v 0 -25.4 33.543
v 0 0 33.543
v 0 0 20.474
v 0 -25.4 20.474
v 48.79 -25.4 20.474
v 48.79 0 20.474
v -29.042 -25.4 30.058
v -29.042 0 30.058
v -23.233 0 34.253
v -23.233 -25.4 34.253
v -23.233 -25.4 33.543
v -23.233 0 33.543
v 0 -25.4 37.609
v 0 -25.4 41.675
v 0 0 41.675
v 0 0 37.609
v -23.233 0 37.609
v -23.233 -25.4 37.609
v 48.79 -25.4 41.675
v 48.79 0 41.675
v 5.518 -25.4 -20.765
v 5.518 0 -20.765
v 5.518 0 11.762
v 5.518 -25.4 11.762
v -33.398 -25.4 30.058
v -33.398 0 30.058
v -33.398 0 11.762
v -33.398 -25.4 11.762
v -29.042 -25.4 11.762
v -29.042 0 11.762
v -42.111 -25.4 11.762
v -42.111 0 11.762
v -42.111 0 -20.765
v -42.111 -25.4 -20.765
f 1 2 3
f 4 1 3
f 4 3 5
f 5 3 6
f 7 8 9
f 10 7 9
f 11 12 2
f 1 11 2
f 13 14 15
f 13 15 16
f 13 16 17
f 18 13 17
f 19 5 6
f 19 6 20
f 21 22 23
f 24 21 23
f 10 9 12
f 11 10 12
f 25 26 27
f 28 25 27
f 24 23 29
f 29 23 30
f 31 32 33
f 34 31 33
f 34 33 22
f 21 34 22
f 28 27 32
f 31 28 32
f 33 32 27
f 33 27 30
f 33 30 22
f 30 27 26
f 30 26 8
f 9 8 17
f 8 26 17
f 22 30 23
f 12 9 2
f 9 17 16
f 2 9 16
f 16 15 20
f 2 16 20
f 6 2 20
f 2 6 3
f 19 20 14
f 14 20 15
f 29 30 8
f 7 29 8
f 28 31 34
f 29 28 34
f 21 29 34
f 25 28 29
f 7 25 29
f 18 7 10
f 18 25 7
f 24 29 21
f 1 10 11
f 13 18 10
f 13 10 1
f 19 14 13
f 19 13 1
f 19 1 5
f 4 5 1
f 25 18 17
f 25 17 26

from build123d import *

# Parameters (mm, degrees)
F0_W     = 4.3562594801
F0_H     = 11.6166975349
F0_H_2   = 6.6796019673
F0_W_2   = 8.1316875294
F0_H_3   = 4.0658414364
F0_H_4   = 2.6137568057
F1_DEPTH = 25.4


with BuildPart() as f1:
    # F0 (on Front) → F1 (new body)
    with BuildSketch(Plane.XZ):
        with Locations((-31.219872646, 17.5702543929)):
            Rectangle(F0_W, F0_H)
        Polygon((-33.3980023861, 11.7619056255), (-42.1105250716, 11.7619056255), (-42.1105250716, -20.7648463547), (5.517931655, -20.7648463547), (5.517931655, 11.7619056255), (-29.041742906, 11.7619056255), (-29.041742906, 9.1481488198), (-33.3980023861, 9.1481488198), align=None)
        Polygon((0, 41.6749008), (0, 37.6090556383), (8.1316875294, 37.6090556383), (8.1316875294, 33.5432142019), (0, 33.5432142019), (0, 20.474428311), (48.790127039, 20.474428311), (48.790127039, 41.6749008), align=None)
        Polygon((-18.5867156833, 37.6090556383), (-23.2333932072, 34.2531229749), (-23.2333932072, 33.5432142019), (0, 33.5432142019), (0, 37.6090556383), align=None)
        with Locations((-31.219872646, 26.718404144)):
            Rectangle(F0_W, F0_H_2)
        with Locations((4.0658437647, 35.5761349201)):
            Rectangle(F0_W_2, F0_H_3)
        Polygon((-23.2333932072, 37.6090556383), (-33.3980023861, 30.0582051277), (-29.041742906, 30.0582051277), (-23.2333932072, 34.2531229749), align=None)
        with Locations((-31.219872646, 10.4550272226)):
            Rectangle(F0_W, F0_H_4)
        Polygon((-18.5867156833, 37.6090556383), (-23.2333932072, 37.6090556383), (-23.2333932072, 34.2531229749), align=None)
    extrude(amount=F1_DEPTH)


solid = f1.part
